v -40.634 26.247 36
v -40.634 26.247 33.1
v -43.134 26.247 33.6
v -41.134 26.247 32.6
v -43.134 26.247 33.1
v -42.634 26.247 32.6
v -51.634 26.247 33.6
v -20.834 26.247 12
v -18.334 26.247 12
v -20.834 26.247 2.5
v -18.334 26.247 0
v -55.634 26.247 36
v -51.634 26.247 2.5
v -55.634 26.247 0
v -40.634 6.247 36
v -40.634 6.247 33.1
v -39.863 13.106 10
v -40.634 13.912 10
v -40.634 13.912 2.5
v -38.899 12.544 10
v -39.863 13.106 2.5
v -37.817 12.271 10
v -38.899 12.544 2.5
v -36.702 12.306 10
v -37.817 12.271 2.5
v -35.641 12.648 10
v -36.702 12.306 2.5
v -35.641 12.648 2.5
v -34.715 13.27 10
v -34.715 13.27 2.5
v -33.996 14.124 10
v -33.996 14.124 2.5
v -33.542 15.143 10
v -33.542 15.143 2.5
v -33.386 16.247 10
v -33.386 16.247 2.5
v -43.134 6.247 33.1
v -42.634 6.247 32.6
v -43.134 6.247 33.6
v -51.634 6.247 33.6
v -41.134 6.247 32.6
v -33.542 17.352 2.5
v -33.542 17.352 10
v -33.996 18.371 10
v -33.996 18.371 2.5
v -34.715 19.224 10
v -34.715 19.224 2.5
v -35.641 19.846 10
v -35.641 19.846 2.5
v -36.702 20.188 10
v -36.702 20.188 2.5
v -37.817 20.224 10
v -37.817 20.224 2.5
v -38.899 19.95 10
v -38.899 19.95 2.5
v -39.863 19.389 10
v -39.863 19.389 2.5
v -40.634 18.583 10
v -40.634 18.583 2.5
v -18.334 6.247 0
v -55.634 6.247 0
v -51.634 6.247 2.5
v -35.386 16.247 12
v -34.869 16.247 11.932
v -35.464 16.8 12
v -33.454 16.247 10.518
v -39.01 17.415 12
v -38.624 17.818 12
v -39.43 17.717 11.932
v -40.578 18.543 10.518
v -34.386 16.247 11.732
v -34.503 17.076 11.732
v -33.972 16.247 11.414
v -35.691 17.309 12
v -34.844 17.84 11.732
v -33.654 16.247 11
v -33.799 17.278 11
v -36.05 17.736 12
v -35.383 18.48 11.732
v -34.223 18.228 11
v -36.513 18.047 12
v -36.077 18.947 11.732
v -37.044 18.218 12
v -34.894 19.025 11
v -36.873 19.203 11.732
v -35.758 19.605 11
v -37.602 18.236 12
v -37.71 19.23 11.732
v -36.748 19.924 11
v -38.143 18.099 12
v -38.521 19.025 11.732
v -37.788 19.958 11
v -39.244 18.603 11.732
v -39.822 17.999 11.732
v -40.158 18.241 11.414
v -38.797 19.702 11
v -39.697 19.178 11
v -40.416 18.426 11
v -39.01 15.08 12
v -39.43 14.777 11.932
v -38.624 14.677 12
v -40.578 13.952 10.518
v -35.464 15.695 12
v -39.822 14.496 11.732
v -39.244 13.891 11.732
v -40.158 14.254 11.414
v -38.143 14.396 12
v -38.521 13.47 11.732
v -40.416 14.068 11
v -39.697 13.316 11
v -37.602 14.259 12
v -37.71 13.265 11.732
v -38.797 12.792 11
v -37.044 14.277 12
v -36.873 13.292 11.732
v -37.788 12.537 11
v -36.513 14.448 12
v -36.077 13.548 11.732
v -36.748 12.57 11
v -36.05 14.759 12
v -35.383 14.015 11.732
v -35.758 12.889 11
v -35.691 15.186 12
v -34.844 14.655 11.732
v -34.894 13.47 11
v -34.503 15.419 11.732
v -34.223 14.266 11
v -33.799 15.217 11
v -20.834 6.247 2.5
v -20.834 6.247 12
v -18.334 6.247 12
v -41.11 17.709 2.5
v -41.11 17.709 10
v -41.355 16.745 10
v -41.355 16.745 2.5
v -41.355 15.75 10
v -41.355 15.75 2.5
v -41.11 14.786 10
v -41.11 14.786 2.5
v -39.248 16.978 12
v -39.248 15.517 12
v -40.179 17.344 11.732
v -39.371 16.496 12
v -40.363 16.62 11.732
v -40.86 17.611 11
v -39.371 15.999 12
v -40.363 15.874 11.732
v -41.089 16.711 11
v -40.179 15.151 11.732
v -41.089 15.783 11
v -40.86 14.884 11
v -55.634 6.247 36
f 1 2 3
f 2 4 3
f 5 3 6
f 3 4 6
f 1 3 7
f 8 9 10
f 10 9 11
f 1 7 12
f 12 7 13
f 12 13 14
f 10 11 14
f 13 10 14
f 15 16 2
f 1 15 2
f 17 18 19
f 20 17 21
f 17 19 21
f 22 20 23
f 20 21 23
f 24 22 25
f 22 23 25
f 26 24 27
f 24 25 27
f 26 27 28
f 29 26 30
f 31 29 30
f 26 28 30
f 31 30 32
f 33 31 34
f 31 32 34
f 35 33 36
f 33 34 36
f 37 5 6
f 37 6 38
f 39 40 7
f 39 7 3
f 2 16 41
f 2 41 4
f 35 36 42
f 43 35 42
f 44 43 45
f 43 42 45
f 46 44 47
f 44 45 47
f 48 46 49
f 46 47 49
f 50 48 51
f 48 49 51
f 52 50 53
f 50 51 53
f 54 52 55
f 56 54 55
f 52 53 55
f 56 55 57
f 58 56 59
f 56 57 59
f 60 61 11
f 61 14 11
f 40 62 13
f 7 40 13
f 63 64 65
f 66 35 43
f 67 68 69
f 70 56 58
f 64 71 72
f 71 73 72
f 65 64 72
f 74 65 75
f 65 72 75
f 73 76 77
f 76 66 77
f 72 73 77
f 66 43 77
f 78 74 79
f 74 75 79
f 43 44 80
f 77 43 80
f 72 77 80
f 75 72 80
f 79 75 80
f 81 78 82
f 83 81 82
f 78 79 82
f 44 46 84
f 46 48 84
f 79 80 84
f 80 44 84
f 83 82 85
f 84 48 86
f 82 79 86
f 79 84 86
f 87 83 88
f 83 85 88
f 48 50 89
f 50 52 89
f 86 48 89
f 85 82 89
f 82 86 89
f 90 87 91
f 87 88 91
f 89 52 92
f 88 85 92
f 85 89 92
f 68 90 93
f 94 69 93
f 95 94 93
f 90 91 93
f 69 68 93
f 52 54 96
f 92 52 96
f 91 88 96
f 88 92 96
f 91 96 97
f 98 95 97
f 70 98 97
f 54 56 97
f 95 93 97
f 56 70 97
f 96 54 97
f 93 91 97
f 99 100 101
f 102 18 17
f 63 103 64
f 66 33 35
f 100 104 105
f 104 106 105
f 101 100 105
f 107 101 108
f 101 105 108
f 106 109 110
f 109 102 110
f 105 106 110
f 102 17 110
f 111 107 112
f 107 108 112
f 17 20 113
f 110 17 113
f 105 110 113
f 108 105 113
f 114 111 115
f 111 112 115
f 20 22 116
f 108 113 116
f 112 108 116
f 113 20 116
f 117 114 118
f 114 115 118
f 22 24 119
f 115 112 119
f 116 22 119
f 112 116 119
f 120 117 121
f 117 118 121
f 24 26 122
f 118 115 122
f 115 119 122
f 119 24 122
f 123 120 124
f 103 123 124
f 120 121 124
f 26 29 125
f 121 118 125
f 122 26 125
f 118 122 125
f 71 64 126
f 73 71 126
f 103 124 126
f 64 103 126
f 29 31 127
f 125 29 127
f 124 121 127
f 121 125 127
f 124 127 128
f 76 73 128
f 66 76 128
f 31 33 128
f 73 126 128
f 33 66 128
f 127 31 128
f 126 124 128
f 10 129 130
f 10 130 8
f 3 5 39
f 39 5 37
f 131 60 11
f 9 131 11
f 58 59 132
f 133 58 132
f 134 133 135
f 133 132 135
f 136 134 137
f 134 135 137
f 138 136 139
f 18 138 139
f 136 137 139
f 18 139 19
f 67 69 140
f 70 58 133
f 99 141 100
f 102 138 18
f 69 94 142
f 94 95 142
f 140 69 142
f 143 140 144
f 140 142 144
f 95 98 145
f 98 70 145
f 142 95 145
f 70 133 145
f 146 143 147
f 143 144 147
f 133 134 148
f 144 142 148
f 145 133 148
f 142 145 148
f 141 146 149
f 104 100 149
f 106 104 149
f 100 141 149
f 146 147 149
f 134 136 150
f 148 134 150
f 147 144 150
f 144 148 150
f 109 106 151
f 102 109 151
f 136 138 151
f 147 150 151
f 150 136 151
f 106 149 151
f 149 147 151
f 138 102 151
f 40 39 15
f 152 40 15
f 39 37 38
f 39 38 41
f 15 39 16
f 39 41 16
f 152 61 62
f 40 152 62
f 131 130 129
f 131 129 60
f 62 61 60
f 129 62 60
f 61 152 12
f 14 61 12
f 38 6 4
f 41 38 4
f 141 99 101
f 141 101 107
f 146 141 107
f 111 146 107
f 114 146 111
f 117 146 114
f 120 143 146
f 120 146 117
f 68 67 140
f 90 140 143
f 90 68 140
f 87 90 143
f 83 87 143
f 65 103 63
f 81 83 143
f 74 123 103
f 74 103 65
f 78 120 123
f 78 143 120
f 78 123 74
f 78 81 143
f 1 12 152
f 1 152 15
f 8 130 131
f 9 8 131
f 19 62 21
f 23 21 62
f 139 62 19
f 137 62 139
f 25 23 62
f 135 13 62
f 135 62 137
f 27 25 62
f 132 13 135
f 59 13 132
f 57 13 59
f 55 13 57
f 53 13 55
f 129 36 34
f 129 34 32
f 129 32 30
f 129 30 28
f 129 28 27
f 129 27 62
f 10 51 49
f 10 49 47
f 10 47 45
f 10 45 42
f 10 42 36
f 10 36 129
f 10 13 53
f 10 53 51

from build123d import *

# Parameters (mm, degrees)
F0_W     = 2.5
F0_H     = 20
F0_W_2   = 4
F0_W_3   = 8.5
F1_DEPTH = 2.5
F2_DEPTH = 12
F3_DEPTH = 12
F4_DEPTH = 36
F5_START = 33.6
F5_DEPTH = 2.4
F6_R     = 2
F7_START = 32.6
F7_DEPTH = 3.4
F8_SIZE  = 0.5


with BuildPart() as f1:
    # F0 (on Top) → F1 (new body)
    with BuildSketch(Plane.XY):
        with BuildLine():
            ThreePointArc((-40.6337848902, 13.9120002314), (-41.3863019049, 16.2473490834), (-40.6337848902, 18.5826979354))
            Line((-40.6337848902, 18.5826979354), (-40.6337848902, 26.2473490834))
            Line((-40.6337848902, 26.2473490834), (-43.1337848902, 26.2473490834))
            Line((-43.1337848902, 26.2473490834), (-43.1337848902, 6.2473490834))
            Line((-43.1337848902, 6.2473490834), (-40.6337848902, 6.2473490834))
            Line((-40.6337848902, 6.2473490834), (-40.6337848902, 13.9120002314))
        make_face()
        with BuildLine():
            ThreePointArc((-40.6337848902, 18.5826979354), (-36.159503621, 20.0545745785), (-33.3863019049, 16.2473490834))
            ThreePointArc((-33.3863019049, 16.2473490834), (-36.159503621, 12.4401235883), (-40.6337848902, 13.9120002314))
            Line((-40.6337848902, 13.9120002314), (-40.6337848902, 6.2473490834))
            Line((-40.6337848902, 6.2473490834), (-20.8337848902, 6.2473490834))
            Line((-20.8337848902, 6.2473490834), (-20.8337848902, 26.2473490834))
            Line((-20.8337848902, 26.2473490834), (-40.6337848902, 26.2473490834))
            Line((-40.6337848902, 26.2473490834), (-40.6337848902, 18.5826979354))
        make_face()
        with BuildLine():
            Line((-40.6337848902, 13.9120002314), (-40.6337848902, 18.5826979354))
            ThreePointArc((-40.6337848902, 18.5826979354), (-41.3863019049, 16.2473490834), (-40.6337848902, 13.9120002314))
        make_face()
        with BuildLine():
            ThreePointArc((-40.6337848902, 13.9120002314), (-36.159503621, 12.4401235883), (-33.3863019049, 16.2473490834))
            ThreePointArc((-33.3863019049, 16.2473490834), (-36.159503621, 20.0545745785), (-40.6337848902, 18.5826979354))
            Line((-40.6337848902, 18.5826979354), (-40.6337848902, 13.9120002314))
        make_face()
        with Locations((-19.5837848902, 16.2473490834)):
            Rectangle(F0_W, F0_H)
        with Locations((-53.6337848902, 16.2473490834)):
            Rectangle(F0_W_2, F0_H)
        with Locations((-47.3837848902, 16.2473490834)):
            Rectangle(F0_W_3, F0_H)
    extrude(amount=F1_DEPTH)

    # F0 (on Top) → F2 (join)
    with BuildSketch(Plane.XY):
        with Locations((-19.5837848902, 16.2473490834)):
            Rectangle(F0_W, F0_H)
    extrude(amount=F2_DEPTH)

    # F0 (on Top) → F3 (join)
    with BuildSketch(Plane.XY):
        with BuildLine():
            Line((-40.6337848902, 13.9120002314), (-40.6337848902, 18.5826979354))
            ThreePointArc((-40.6337848902, 18.5826979354), (-41.3863019049, 16.2473490834), (-40.6337848902, 13.9120002314))
        make_face()
        with BuildLine():
            ThreePointArc((-40.6337848902, 13.9120002314), (-36.159503621, 12.4401235883), (-33.3863019049, 16.2473490834))
            ThreePointArc((-33.3863019049, 16.2473490834), (-36.159503621, 20.0545745785), (-40.6337848902, 18.5826979354))
            Line((-40.6337848902, 18.5826979354), (-40.6337848902, 13.9120002314))
        make_face()
    extrude(amount=F3_DEPTH)

    # F0 (on Top) → F4 (join)
    with BuildSketch(Plane.XY):
        with Locations((-53.6337848902, 16.2473490834)):
            Rectangle(F0_W_2, F0_H)
    extrude(amount=F4_DEPTH)

    # F0 (on Top) → F5 (join)
    with BuildSketch(Plane.XY.offset(F5_START)):
        with Locations((-47.3837848902, 16.2473490834)):
            Rectangle(F0_W_3, F0_H)
    extrude(amount=F5_DEPTH)

    # F6
    f6_edges = [f1.edges().sort_by_distance(p)[0] for p in [
        (-34.138819, 18.582698, 12),
    ]]
    fillet(f6_edges, radius=F6_R)

    # F0 (on Top) → F7 (join)
    with BuildSketch(Plane.XY.offset(F7_START)):
        with BuildLine():
            ThreePointArc((-40.6337848902, 13.9120002314), (-41.3863019049, 16.2473490834), (-40.6337848902, 18.5826979354))
            Line((-40.6337848902, 18.5826979354), (-40.6337848902, 26.2473490834))
            Line((-40.6337848902, 26.2473490834), (-43.1337848902, 26.2473490834))
            Line((-43.1337848902, 26.2473490834), (-43.1337848902, 6.2473490834))
            Line((-43.1337848902, 6.2473490834), (-40.6337848902, 6.2473490834))
            Line((-40.6337848902, 6.2473490834), (-40.6337848902, 13.9120002314))
        make_face()
        with BuildLine():
            Line((-40.6337848902, 13.9120002314), (-40.6337848902, 18.5826979354))
            ThreePointArc((-40.6337848902, 18.5826979354), (-41.3863019049, 16.2473490834), (-40.6337848902, 13.9120002314))
        make_face()
    extrude(amount=F7_DEPTH)

    # F8
    f8_edges = [f1.edges().sort_by_distance(p)[0] for p in [
        (-40.633785, 16.247349, 32.6),
        (-43.133785, 16.247349, 32.6),
    ]]
    chamfer(f8_edges, length=F8_SIZE)


solid = f1.part
